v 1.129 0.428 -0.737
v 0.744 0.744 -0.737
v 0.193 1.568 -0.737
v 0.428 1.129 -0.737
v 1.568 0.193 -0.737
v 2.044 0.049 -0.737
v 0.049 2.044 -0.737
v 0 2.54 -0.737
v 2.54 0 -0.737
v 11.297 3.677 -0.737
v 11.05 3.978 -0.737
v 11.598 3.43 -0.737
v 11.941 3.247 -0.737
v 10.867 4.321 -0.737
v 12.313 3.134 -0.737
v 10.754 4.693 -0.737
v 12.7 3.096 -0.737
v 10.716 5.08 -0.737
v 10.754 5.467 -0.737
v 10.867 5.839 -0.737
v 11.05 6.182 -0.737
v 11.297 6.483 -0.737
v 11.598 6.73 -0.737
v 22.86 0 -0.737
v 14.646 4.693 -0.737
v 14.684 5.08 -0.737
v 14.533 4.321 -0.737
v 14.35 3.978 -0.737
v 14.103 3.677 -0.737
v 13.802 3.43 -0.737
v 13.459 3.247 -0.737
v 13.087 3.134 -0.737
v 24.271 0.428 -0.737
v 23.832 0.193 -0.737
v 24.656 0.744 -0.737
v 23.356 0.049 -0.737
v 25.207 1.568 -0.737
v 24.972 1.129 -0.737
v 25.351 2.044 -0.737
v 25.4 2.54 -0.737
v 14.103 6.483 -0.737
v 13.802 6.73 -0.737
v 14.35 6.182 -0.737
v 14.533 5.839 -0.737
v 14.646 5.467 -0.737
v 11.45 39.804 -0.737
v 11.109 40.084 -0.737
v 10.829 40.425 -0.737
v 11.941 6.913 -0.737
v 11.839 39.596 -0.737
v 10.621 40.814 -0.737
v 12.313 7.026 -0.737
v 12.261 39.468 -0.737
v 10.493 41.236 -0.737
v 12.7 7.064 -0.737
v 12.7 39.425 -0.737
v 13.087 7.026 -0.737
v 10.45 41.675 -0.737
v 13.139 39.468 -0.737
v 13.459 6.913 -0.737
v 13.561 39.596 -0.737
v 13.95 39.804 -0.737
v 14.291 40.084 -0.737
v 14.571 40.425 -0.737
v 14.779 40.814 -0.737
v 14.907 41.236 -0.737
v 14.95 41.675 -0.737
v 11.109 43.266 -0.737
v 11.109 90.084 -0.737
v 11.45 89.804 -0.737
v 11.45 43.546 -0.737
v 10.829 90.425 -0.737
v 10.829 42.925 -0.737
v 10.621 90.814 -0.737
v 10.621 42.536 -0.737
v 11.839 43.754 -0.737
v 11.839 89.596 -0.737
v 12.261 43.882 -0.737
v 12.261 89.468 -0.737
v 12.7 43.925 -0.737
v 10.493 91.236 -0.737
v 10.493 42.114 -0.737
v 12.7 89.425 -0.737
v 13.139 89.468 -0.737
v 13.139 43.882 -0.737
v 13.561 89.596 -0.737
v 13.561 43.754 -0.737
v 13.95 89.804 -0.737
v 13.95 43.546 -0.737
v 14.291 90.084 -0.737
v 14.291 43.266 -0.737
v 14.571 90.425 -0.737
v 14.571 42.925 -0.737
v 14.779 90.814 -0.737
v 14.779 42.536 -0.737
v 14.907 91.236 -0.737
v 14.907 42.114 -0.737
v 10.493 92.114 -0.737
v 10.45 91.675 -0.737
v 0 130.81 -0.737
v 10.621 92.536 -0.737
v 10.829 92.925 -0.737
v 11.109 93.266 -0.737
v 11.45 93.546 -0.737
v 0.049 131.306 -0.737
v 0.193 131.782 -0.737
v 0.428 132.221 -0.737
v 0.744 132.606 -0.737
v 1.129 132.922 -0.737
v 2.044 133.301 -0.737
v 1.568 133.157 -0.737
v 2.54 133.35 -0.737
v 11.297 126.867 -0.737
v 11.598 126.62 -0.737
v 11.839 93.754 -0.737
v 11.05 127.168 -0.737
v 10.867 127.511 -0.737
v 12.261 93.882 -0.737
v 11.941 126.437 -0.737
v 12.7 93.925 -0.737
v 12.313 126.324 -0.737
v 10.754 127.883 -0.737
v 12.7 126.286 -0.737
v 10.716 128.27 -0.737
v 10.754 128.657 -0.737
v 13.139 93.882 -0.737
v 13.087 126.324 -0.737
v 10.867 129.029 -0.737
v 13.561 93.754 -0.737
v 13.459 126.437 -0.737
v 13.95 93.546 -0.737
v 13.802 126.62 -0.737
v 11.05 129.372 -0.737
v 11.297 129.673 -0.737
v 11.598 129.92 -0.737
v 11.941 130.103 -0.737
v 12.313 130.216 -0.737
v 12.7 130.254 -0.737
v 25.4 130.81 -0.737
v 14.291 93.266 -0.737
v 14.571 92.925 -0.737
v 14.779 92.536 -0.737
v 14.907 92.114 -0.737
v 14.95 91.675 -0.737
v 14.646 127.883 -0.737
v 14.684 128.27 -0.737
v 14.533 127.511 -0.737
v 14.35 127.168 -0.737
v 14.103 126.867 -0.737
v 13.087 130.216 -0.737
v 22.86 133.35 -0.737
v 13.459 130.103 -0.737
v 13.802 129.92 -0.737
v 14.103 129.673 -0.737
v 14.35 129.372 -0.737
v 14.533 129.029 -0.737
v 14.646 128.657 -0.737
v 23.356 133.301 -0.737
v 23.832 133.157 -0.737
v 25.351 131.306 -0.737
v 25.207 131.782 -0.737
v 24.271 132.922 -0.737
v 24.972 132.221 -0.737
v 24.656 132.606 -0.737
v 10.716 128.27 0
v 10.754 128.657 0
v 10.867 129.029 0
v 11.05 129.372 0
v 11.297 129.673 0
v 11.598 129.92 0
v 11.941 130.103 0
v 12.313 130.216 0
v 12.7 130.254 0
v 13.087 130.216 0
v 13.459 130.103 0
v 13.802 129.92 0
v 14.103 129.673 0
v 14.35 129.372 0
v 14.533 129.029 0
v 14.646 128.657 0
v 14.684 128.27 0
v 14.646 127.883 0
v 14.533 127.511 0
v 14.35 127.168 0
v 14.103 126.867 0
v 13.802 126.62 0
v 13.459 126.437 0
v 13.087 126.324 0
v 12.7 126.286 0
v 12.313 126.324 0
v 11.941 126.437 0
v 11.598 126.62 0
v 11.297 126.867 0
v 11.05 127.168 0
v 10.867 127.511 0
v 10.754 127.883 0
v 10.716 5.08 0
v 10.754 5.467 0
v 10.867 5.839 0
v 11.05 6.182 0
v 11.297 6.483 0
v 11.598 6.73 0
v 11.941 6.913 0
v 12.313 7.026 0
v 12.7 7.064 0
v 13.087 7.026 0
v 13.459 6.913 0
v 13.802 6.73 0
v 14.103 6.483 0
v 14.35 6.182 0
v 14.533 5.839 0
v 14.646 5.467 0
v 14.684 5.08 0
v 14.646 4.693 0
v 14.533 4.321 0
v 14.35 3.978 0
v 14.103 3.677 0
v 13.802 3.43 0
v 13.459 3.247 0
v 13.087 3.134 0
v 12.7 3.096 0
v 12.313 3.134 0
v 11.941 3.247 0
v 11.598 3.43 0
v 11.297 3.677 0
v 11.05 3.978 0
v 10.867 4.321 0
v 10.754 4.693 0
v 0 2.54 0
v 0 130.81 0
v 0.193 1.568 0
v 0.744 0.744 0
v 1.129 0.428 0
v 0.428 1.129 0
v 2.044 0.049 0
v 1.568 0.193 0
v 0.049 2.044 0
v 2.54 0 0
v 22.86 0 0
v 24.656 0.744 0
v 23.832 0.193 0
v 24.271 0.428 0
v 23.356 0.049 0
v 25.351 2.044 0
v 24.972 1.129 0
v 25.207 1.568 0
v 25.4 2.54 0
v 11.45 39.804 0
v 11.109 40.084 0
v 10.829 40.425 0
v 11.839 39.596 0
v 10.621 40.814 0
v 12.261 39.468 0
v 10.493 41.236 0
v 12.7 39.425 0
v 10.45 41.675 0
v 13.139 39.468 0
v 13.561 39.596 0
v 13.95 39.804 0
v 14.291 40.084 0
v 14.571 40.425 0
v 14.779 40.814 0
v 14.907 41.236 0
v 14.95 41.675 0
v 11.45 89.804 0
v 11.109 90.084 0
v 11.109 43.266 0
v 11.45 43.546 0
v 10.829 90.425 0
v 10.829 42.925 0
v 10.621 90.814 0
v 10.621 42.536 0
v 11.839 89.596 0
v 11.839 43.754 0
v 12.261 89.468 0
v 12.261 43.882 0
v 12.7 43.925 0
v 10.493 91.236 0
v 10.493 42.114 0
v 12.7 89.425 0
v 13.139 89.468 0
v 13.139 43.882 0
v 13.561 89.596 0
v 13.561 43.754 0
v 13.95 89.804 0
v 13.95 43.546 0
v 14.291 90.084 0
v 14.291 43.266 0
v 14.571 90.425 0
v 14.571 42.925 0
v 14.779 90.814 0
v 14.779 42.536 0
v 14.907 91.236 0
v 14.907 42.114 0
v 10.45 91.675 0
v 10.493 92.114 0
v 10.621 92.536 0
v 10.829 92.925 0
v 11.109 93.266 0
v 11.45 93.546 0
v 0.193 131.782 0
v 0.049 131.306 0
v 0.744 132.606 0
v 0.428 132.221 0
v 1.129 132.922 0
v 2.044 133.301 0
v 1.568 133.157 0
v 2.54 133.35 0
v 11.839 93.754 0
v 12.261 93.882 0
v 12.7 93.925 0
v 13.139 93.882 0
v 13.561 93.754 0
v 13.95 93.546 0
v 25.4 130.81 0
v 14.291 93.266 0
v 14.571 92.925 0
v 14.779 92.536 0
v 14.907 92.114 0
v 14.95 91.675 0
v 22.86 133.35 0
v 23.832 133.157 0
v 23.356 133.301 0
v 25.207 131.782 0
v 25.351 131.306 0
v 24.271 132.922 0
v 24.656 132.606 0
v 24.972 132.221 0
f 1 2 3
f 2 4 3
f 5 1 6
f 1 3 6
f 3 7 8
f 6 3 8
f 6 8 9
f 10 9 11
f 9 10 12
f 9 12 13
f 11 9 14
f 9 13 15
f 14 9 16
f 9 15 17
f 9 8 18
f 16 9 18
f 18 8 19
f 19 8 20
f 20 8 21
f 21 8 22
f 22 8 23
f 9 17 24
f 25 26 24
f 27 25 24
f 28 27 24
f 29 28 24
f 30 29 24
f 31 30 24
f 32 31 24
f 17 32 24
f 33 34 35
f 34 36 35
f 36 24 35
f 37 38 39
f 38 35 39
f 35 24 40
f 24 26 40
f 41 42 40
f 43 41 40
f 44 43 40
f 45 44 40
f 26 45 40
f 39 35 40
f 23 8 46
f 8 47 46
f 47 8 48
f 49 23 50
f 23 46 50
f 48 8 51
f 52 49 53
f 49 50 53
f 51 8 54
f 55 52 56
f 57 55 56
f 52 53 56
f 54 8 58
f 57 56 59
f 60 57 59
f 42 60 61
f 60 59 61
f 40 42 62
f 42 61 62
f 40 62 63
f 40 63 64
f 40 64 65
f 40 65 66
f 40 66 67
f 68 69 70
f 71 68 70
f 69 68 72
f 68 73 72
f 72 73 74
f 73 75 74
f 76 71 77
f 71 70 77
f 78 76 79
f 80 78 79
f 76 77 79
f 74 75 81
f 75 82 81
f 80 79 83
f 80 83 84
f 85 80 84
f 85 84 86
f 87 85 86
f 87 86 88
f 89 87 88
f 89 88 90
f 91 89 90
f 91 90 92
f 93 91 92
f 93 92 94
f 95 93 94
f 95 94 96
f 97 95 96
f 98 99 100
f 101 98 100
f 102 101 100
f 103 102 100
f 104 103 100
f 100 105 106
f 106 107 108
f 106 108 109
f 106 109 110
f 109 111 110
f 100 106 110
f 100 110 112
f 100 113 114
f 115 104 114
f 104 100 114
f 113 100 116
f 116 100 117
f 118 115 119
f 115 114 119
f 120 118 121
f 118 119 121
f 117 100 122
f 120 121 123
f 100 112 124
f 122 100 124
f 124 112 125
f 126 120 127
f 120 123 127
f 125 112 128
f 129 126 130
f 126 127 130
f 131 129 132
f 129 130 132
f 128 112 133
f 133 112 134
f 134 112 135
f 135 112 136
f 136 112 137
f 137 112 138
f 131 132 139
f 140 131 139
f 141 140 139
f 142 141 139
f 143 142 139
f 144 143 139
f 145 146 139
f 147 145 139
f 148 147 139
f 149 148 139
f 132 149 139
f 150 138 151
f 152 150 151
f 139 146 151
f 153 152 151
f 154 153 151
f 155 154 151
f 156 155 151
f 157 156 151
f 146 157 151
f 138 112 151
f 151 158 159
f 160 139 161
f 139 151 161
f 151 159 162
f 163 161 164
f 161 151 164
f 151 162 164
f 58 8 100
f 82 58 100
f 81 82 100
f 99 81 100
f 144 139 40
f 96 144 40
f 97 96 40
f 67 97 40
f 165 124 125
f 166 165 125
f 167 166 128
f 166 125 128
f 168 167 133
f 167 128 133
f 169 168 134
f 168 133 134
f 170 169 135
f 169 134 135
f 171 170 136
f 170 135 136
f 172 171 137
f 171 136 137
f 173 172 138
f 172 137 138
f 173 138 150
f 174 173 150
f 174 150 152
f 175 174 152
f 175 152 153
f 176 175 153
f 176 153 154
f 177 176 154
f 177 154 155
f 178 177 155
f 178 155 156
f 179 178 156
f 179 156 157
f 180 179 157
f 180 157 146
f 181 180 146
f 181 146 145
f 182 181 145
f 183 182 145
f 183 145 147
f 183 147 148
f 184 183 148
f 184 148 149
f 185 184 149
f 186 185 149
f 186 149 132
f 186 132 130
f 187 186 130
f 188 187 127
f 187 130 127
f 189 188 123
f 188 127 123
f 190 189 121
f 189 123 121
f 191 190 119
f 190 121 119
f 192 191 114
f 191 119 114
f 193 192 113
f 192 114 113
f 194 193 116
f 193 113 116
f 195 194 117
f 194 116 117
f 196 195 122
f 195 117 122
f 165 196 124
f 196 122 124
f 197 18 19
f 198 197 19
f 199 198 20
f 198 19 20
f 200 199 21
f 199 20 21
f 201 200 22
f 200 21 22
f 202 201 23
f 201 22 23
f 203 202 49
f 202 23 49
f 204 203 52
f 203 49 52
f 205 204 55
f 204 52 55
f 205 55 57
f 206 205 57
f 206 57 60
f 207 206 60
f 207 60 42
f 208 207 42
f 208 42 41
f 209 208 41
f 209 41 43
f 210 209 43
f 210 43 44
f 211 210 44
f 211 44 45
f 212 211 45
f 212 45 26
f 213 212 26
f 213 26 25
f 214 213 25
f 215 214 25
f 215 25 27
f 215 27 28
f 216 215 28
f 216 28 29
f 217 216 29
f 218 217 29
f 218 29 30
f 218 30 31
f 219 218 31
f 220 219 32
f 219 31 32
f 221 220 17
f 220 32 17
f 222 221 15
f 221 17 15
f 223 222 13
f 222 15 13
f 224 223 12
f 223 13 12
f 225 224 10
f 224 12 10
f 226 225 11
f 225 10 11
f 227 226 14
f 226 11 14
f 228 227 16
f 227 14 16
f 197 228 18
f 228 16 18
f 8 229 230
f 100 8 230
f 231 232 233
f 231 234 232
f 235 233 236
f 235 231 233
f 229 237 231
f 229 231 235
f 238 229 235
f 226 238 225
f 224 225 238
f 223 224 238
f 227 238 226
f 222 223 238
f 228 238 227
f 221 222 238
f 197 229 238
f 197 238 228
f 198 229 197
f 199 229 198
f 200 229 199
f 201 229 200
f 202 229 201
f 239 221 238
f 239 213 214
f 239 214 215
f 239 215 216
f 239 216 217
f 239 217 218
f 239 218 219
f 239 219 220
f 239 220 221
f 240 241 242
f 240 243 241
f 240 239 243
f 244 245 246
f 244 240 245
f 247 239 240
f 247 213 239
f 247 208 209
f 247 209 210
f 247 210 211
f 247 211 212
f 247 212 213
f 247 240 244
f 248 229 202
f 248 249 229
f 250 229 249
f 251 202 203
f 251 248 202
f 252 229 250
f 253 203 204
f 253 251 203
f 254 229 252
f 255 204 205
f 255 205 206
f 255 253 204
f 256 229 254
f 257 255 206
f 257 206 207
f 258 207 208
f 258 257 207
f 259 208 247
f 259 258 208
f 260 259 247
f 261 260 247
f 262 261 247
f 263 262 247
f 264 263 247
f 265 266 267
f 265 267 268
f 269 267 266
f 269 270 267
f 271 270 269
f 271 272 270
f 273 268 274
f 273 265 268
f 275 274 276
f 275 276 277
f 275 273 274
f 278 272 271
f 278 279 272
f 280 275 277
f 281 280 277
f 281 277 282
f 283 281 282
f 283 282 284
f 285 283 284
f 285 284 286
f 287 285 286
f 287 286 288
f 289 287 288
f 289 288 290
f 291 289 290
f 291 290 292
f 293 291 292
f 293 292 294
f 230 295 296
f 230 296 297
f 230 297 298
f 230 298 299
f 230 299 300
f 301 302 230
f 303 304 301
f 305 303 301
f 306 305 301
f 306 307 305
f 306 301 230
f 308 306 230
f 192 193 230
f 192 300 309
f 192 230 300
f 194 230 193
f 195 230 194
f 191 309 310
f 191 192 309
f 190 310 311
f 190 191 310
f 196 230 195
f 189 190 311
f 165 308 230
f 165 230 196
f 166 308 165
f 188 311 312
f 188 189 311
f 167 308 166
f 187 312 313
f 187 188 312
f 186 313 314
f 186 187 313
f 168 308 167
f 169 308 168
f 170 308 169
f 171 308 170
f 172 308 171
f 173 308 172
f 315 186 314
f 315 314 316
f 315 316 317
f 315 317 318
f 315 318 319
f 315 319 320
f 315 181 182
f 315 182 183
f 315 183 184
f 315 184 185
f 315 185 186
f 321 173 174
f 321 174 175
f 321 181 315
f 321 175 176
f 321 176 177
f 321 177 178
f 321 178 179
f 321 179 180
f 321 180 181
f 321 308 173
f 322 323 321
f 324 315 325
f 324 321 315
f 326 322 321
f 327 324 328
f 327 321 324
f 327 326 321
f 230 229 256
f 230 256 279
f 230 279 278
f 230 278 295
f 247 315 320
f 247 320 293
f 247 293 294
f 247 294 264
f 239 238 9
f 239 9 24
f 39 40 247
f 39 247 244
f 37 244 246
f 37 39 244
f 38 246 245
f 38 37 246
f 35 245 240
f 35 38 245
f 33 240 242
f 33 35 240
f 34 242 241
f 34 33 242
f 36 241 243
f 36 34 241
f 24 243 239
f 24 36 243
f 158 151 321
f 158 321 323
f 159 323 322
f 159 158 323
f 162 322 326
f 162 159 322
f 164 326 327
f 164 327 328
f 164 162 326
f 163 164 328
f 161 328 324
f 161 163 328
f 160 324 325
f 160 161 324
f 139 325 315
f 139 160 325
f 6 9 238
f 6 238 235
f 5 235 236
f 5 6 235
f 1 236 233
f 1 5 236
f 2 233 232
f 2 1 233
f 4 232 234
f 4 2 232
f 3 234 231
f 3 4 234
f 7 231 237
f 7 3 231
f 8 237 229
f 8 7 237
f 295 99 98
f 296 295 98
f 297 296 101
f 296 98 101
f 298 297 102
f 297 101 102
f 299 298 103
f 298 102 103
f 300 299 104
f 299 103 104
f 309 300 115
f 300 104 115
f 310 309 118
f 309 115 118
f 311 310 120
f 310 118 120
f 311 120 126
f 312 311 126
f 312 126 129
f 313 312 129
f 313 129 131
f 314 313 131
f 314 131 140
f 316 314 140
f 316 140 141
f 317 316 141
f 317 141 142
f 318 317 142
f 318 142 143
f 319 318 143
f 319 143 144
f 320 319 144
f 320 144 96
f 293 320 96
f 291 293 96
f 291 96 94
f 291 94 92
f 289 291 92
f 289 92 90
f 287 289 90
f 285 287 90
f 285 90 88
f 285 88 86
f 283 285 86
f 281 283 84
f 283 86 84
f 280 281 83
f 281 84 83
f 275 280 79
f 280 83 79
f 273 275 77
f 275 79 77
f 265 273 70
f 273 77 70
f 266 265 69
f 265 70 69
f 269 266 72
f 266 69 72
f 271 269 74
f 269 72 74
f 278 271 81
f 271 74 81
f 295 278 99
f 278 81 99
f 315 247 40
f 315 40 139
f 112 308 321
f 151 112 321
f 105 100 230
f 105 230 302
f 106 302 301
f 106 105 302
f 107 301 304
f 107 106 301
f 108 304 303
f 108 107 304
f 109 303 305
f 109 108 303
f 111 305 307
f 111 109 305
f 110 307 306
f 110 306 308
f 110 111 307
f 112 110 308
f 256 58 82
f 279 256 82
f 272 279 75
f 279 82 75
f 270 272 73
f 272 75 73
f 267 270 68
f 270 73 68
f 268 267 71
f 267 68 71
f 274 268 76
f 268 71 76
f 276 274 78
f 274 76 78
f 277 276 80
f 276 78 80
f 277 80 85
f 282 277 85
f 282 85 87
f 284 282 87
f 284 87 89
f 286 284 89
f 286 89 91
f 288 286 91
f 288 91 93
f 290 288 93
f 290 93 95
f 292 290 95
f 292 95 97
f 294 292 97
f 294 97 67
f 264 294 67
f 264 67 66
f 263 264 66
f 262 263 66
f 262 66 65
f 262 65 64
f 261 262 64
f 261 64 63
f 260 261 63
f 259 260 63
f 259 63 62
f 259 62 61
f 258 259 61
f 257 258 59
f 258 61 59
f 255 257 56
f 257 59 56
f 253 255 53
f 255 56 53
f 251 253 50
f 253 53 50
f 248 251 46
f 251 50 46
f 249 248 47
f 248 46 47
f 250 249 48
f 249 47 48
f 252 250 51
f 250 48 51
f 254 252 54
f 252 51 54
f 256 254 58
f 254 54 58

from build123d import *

# Parameters (mm, degrees)
SKETCH1_W                       = 25.4
SKETCH1_H                       = 133.35
BASE_FLANGE1_DEPTH              = 0.7366
BREAK_CORNER1_START             = -0.7366
BREAK_CORNER1_DEPTH             = 0.7366
M4_CLEARANCE_HOLE2_D            = 4.5
F_5_32_0_15625_DIAMETER_HOLE2_D = 3.96875


# Read off the part's stored shape, not the designer's step: Break-Corner1
# Sheet-metal steps are written as plain solids
with BuildPart() as part:
    # Sketch1 → Base-Flange1 (new body)
    with BuildSketch(Plane.XY):
        with Locations((12.7, 66.675)):
            Rectangle(SKETCH1_W, SKETCH1_H)
    extrude(amount=-BASE_FLANGE1_DEPTH)

    # Break-Corner1 outline → Break-Corner1 (cut)
    with BuildSketch(Plane.XY.offset(BREAK_CORNER1_START)):
        with BuildLine():
            ThreePointArc((2.54, 0), (0.743948776, 0.743948776), (0, 2.54))
            Line((0, 2.54), (0, 0))
            Line((0, 0), (2.54, 0))
        make_face()
        with BuildLine():
            Line((0, 133.35), (0, 130.81))
            ThreePointArc((0, 130.81), (0.743948776, 132.606051224), (2.54, 133.35))
            Line((2.54, 133.35), (0, 133.35))
        make_face()
        with BuildLine():
            ThreePointArc((25.4, 2.54), (24.656051224, 0.743948776), (22.86, 0))
            Line((22.86, 0), (25.4, 0))
            Line((25.4, 0), (25.4, 2.54))
        make_face()
        with BuildLine():
            Line((25.4, 133.35), (22.86, 133.35))
            ThreePointArc((22.86, 133.35), (24.656051224, 132.606051224), (25.4, 130.81))
            Line((25.4, 130.81), (25.4, 133.35))
        make_face()
    extrude(amount=BREAK_CORNER1_DEPTH, mode=Mode.SUBTRACT)

    # M4 Clearance Hole2 (through all)
    with Locations(Plane.XY):
        with Locations((12.7, 91.675), (12.7, 41.675)):
            Hole(M4_CLEARANCE_HOLE2_D / 2)

    # 5/32 (0.15625) Diameter Hole2 (through all)
    with Locations(Plane.XY):
        with Locations((12.7, 5.08), (12.7, 128.27)):
            Hole(F_5_32_0_15625_DIAMETER_HOLE2_D / 2)


solid = part.part
